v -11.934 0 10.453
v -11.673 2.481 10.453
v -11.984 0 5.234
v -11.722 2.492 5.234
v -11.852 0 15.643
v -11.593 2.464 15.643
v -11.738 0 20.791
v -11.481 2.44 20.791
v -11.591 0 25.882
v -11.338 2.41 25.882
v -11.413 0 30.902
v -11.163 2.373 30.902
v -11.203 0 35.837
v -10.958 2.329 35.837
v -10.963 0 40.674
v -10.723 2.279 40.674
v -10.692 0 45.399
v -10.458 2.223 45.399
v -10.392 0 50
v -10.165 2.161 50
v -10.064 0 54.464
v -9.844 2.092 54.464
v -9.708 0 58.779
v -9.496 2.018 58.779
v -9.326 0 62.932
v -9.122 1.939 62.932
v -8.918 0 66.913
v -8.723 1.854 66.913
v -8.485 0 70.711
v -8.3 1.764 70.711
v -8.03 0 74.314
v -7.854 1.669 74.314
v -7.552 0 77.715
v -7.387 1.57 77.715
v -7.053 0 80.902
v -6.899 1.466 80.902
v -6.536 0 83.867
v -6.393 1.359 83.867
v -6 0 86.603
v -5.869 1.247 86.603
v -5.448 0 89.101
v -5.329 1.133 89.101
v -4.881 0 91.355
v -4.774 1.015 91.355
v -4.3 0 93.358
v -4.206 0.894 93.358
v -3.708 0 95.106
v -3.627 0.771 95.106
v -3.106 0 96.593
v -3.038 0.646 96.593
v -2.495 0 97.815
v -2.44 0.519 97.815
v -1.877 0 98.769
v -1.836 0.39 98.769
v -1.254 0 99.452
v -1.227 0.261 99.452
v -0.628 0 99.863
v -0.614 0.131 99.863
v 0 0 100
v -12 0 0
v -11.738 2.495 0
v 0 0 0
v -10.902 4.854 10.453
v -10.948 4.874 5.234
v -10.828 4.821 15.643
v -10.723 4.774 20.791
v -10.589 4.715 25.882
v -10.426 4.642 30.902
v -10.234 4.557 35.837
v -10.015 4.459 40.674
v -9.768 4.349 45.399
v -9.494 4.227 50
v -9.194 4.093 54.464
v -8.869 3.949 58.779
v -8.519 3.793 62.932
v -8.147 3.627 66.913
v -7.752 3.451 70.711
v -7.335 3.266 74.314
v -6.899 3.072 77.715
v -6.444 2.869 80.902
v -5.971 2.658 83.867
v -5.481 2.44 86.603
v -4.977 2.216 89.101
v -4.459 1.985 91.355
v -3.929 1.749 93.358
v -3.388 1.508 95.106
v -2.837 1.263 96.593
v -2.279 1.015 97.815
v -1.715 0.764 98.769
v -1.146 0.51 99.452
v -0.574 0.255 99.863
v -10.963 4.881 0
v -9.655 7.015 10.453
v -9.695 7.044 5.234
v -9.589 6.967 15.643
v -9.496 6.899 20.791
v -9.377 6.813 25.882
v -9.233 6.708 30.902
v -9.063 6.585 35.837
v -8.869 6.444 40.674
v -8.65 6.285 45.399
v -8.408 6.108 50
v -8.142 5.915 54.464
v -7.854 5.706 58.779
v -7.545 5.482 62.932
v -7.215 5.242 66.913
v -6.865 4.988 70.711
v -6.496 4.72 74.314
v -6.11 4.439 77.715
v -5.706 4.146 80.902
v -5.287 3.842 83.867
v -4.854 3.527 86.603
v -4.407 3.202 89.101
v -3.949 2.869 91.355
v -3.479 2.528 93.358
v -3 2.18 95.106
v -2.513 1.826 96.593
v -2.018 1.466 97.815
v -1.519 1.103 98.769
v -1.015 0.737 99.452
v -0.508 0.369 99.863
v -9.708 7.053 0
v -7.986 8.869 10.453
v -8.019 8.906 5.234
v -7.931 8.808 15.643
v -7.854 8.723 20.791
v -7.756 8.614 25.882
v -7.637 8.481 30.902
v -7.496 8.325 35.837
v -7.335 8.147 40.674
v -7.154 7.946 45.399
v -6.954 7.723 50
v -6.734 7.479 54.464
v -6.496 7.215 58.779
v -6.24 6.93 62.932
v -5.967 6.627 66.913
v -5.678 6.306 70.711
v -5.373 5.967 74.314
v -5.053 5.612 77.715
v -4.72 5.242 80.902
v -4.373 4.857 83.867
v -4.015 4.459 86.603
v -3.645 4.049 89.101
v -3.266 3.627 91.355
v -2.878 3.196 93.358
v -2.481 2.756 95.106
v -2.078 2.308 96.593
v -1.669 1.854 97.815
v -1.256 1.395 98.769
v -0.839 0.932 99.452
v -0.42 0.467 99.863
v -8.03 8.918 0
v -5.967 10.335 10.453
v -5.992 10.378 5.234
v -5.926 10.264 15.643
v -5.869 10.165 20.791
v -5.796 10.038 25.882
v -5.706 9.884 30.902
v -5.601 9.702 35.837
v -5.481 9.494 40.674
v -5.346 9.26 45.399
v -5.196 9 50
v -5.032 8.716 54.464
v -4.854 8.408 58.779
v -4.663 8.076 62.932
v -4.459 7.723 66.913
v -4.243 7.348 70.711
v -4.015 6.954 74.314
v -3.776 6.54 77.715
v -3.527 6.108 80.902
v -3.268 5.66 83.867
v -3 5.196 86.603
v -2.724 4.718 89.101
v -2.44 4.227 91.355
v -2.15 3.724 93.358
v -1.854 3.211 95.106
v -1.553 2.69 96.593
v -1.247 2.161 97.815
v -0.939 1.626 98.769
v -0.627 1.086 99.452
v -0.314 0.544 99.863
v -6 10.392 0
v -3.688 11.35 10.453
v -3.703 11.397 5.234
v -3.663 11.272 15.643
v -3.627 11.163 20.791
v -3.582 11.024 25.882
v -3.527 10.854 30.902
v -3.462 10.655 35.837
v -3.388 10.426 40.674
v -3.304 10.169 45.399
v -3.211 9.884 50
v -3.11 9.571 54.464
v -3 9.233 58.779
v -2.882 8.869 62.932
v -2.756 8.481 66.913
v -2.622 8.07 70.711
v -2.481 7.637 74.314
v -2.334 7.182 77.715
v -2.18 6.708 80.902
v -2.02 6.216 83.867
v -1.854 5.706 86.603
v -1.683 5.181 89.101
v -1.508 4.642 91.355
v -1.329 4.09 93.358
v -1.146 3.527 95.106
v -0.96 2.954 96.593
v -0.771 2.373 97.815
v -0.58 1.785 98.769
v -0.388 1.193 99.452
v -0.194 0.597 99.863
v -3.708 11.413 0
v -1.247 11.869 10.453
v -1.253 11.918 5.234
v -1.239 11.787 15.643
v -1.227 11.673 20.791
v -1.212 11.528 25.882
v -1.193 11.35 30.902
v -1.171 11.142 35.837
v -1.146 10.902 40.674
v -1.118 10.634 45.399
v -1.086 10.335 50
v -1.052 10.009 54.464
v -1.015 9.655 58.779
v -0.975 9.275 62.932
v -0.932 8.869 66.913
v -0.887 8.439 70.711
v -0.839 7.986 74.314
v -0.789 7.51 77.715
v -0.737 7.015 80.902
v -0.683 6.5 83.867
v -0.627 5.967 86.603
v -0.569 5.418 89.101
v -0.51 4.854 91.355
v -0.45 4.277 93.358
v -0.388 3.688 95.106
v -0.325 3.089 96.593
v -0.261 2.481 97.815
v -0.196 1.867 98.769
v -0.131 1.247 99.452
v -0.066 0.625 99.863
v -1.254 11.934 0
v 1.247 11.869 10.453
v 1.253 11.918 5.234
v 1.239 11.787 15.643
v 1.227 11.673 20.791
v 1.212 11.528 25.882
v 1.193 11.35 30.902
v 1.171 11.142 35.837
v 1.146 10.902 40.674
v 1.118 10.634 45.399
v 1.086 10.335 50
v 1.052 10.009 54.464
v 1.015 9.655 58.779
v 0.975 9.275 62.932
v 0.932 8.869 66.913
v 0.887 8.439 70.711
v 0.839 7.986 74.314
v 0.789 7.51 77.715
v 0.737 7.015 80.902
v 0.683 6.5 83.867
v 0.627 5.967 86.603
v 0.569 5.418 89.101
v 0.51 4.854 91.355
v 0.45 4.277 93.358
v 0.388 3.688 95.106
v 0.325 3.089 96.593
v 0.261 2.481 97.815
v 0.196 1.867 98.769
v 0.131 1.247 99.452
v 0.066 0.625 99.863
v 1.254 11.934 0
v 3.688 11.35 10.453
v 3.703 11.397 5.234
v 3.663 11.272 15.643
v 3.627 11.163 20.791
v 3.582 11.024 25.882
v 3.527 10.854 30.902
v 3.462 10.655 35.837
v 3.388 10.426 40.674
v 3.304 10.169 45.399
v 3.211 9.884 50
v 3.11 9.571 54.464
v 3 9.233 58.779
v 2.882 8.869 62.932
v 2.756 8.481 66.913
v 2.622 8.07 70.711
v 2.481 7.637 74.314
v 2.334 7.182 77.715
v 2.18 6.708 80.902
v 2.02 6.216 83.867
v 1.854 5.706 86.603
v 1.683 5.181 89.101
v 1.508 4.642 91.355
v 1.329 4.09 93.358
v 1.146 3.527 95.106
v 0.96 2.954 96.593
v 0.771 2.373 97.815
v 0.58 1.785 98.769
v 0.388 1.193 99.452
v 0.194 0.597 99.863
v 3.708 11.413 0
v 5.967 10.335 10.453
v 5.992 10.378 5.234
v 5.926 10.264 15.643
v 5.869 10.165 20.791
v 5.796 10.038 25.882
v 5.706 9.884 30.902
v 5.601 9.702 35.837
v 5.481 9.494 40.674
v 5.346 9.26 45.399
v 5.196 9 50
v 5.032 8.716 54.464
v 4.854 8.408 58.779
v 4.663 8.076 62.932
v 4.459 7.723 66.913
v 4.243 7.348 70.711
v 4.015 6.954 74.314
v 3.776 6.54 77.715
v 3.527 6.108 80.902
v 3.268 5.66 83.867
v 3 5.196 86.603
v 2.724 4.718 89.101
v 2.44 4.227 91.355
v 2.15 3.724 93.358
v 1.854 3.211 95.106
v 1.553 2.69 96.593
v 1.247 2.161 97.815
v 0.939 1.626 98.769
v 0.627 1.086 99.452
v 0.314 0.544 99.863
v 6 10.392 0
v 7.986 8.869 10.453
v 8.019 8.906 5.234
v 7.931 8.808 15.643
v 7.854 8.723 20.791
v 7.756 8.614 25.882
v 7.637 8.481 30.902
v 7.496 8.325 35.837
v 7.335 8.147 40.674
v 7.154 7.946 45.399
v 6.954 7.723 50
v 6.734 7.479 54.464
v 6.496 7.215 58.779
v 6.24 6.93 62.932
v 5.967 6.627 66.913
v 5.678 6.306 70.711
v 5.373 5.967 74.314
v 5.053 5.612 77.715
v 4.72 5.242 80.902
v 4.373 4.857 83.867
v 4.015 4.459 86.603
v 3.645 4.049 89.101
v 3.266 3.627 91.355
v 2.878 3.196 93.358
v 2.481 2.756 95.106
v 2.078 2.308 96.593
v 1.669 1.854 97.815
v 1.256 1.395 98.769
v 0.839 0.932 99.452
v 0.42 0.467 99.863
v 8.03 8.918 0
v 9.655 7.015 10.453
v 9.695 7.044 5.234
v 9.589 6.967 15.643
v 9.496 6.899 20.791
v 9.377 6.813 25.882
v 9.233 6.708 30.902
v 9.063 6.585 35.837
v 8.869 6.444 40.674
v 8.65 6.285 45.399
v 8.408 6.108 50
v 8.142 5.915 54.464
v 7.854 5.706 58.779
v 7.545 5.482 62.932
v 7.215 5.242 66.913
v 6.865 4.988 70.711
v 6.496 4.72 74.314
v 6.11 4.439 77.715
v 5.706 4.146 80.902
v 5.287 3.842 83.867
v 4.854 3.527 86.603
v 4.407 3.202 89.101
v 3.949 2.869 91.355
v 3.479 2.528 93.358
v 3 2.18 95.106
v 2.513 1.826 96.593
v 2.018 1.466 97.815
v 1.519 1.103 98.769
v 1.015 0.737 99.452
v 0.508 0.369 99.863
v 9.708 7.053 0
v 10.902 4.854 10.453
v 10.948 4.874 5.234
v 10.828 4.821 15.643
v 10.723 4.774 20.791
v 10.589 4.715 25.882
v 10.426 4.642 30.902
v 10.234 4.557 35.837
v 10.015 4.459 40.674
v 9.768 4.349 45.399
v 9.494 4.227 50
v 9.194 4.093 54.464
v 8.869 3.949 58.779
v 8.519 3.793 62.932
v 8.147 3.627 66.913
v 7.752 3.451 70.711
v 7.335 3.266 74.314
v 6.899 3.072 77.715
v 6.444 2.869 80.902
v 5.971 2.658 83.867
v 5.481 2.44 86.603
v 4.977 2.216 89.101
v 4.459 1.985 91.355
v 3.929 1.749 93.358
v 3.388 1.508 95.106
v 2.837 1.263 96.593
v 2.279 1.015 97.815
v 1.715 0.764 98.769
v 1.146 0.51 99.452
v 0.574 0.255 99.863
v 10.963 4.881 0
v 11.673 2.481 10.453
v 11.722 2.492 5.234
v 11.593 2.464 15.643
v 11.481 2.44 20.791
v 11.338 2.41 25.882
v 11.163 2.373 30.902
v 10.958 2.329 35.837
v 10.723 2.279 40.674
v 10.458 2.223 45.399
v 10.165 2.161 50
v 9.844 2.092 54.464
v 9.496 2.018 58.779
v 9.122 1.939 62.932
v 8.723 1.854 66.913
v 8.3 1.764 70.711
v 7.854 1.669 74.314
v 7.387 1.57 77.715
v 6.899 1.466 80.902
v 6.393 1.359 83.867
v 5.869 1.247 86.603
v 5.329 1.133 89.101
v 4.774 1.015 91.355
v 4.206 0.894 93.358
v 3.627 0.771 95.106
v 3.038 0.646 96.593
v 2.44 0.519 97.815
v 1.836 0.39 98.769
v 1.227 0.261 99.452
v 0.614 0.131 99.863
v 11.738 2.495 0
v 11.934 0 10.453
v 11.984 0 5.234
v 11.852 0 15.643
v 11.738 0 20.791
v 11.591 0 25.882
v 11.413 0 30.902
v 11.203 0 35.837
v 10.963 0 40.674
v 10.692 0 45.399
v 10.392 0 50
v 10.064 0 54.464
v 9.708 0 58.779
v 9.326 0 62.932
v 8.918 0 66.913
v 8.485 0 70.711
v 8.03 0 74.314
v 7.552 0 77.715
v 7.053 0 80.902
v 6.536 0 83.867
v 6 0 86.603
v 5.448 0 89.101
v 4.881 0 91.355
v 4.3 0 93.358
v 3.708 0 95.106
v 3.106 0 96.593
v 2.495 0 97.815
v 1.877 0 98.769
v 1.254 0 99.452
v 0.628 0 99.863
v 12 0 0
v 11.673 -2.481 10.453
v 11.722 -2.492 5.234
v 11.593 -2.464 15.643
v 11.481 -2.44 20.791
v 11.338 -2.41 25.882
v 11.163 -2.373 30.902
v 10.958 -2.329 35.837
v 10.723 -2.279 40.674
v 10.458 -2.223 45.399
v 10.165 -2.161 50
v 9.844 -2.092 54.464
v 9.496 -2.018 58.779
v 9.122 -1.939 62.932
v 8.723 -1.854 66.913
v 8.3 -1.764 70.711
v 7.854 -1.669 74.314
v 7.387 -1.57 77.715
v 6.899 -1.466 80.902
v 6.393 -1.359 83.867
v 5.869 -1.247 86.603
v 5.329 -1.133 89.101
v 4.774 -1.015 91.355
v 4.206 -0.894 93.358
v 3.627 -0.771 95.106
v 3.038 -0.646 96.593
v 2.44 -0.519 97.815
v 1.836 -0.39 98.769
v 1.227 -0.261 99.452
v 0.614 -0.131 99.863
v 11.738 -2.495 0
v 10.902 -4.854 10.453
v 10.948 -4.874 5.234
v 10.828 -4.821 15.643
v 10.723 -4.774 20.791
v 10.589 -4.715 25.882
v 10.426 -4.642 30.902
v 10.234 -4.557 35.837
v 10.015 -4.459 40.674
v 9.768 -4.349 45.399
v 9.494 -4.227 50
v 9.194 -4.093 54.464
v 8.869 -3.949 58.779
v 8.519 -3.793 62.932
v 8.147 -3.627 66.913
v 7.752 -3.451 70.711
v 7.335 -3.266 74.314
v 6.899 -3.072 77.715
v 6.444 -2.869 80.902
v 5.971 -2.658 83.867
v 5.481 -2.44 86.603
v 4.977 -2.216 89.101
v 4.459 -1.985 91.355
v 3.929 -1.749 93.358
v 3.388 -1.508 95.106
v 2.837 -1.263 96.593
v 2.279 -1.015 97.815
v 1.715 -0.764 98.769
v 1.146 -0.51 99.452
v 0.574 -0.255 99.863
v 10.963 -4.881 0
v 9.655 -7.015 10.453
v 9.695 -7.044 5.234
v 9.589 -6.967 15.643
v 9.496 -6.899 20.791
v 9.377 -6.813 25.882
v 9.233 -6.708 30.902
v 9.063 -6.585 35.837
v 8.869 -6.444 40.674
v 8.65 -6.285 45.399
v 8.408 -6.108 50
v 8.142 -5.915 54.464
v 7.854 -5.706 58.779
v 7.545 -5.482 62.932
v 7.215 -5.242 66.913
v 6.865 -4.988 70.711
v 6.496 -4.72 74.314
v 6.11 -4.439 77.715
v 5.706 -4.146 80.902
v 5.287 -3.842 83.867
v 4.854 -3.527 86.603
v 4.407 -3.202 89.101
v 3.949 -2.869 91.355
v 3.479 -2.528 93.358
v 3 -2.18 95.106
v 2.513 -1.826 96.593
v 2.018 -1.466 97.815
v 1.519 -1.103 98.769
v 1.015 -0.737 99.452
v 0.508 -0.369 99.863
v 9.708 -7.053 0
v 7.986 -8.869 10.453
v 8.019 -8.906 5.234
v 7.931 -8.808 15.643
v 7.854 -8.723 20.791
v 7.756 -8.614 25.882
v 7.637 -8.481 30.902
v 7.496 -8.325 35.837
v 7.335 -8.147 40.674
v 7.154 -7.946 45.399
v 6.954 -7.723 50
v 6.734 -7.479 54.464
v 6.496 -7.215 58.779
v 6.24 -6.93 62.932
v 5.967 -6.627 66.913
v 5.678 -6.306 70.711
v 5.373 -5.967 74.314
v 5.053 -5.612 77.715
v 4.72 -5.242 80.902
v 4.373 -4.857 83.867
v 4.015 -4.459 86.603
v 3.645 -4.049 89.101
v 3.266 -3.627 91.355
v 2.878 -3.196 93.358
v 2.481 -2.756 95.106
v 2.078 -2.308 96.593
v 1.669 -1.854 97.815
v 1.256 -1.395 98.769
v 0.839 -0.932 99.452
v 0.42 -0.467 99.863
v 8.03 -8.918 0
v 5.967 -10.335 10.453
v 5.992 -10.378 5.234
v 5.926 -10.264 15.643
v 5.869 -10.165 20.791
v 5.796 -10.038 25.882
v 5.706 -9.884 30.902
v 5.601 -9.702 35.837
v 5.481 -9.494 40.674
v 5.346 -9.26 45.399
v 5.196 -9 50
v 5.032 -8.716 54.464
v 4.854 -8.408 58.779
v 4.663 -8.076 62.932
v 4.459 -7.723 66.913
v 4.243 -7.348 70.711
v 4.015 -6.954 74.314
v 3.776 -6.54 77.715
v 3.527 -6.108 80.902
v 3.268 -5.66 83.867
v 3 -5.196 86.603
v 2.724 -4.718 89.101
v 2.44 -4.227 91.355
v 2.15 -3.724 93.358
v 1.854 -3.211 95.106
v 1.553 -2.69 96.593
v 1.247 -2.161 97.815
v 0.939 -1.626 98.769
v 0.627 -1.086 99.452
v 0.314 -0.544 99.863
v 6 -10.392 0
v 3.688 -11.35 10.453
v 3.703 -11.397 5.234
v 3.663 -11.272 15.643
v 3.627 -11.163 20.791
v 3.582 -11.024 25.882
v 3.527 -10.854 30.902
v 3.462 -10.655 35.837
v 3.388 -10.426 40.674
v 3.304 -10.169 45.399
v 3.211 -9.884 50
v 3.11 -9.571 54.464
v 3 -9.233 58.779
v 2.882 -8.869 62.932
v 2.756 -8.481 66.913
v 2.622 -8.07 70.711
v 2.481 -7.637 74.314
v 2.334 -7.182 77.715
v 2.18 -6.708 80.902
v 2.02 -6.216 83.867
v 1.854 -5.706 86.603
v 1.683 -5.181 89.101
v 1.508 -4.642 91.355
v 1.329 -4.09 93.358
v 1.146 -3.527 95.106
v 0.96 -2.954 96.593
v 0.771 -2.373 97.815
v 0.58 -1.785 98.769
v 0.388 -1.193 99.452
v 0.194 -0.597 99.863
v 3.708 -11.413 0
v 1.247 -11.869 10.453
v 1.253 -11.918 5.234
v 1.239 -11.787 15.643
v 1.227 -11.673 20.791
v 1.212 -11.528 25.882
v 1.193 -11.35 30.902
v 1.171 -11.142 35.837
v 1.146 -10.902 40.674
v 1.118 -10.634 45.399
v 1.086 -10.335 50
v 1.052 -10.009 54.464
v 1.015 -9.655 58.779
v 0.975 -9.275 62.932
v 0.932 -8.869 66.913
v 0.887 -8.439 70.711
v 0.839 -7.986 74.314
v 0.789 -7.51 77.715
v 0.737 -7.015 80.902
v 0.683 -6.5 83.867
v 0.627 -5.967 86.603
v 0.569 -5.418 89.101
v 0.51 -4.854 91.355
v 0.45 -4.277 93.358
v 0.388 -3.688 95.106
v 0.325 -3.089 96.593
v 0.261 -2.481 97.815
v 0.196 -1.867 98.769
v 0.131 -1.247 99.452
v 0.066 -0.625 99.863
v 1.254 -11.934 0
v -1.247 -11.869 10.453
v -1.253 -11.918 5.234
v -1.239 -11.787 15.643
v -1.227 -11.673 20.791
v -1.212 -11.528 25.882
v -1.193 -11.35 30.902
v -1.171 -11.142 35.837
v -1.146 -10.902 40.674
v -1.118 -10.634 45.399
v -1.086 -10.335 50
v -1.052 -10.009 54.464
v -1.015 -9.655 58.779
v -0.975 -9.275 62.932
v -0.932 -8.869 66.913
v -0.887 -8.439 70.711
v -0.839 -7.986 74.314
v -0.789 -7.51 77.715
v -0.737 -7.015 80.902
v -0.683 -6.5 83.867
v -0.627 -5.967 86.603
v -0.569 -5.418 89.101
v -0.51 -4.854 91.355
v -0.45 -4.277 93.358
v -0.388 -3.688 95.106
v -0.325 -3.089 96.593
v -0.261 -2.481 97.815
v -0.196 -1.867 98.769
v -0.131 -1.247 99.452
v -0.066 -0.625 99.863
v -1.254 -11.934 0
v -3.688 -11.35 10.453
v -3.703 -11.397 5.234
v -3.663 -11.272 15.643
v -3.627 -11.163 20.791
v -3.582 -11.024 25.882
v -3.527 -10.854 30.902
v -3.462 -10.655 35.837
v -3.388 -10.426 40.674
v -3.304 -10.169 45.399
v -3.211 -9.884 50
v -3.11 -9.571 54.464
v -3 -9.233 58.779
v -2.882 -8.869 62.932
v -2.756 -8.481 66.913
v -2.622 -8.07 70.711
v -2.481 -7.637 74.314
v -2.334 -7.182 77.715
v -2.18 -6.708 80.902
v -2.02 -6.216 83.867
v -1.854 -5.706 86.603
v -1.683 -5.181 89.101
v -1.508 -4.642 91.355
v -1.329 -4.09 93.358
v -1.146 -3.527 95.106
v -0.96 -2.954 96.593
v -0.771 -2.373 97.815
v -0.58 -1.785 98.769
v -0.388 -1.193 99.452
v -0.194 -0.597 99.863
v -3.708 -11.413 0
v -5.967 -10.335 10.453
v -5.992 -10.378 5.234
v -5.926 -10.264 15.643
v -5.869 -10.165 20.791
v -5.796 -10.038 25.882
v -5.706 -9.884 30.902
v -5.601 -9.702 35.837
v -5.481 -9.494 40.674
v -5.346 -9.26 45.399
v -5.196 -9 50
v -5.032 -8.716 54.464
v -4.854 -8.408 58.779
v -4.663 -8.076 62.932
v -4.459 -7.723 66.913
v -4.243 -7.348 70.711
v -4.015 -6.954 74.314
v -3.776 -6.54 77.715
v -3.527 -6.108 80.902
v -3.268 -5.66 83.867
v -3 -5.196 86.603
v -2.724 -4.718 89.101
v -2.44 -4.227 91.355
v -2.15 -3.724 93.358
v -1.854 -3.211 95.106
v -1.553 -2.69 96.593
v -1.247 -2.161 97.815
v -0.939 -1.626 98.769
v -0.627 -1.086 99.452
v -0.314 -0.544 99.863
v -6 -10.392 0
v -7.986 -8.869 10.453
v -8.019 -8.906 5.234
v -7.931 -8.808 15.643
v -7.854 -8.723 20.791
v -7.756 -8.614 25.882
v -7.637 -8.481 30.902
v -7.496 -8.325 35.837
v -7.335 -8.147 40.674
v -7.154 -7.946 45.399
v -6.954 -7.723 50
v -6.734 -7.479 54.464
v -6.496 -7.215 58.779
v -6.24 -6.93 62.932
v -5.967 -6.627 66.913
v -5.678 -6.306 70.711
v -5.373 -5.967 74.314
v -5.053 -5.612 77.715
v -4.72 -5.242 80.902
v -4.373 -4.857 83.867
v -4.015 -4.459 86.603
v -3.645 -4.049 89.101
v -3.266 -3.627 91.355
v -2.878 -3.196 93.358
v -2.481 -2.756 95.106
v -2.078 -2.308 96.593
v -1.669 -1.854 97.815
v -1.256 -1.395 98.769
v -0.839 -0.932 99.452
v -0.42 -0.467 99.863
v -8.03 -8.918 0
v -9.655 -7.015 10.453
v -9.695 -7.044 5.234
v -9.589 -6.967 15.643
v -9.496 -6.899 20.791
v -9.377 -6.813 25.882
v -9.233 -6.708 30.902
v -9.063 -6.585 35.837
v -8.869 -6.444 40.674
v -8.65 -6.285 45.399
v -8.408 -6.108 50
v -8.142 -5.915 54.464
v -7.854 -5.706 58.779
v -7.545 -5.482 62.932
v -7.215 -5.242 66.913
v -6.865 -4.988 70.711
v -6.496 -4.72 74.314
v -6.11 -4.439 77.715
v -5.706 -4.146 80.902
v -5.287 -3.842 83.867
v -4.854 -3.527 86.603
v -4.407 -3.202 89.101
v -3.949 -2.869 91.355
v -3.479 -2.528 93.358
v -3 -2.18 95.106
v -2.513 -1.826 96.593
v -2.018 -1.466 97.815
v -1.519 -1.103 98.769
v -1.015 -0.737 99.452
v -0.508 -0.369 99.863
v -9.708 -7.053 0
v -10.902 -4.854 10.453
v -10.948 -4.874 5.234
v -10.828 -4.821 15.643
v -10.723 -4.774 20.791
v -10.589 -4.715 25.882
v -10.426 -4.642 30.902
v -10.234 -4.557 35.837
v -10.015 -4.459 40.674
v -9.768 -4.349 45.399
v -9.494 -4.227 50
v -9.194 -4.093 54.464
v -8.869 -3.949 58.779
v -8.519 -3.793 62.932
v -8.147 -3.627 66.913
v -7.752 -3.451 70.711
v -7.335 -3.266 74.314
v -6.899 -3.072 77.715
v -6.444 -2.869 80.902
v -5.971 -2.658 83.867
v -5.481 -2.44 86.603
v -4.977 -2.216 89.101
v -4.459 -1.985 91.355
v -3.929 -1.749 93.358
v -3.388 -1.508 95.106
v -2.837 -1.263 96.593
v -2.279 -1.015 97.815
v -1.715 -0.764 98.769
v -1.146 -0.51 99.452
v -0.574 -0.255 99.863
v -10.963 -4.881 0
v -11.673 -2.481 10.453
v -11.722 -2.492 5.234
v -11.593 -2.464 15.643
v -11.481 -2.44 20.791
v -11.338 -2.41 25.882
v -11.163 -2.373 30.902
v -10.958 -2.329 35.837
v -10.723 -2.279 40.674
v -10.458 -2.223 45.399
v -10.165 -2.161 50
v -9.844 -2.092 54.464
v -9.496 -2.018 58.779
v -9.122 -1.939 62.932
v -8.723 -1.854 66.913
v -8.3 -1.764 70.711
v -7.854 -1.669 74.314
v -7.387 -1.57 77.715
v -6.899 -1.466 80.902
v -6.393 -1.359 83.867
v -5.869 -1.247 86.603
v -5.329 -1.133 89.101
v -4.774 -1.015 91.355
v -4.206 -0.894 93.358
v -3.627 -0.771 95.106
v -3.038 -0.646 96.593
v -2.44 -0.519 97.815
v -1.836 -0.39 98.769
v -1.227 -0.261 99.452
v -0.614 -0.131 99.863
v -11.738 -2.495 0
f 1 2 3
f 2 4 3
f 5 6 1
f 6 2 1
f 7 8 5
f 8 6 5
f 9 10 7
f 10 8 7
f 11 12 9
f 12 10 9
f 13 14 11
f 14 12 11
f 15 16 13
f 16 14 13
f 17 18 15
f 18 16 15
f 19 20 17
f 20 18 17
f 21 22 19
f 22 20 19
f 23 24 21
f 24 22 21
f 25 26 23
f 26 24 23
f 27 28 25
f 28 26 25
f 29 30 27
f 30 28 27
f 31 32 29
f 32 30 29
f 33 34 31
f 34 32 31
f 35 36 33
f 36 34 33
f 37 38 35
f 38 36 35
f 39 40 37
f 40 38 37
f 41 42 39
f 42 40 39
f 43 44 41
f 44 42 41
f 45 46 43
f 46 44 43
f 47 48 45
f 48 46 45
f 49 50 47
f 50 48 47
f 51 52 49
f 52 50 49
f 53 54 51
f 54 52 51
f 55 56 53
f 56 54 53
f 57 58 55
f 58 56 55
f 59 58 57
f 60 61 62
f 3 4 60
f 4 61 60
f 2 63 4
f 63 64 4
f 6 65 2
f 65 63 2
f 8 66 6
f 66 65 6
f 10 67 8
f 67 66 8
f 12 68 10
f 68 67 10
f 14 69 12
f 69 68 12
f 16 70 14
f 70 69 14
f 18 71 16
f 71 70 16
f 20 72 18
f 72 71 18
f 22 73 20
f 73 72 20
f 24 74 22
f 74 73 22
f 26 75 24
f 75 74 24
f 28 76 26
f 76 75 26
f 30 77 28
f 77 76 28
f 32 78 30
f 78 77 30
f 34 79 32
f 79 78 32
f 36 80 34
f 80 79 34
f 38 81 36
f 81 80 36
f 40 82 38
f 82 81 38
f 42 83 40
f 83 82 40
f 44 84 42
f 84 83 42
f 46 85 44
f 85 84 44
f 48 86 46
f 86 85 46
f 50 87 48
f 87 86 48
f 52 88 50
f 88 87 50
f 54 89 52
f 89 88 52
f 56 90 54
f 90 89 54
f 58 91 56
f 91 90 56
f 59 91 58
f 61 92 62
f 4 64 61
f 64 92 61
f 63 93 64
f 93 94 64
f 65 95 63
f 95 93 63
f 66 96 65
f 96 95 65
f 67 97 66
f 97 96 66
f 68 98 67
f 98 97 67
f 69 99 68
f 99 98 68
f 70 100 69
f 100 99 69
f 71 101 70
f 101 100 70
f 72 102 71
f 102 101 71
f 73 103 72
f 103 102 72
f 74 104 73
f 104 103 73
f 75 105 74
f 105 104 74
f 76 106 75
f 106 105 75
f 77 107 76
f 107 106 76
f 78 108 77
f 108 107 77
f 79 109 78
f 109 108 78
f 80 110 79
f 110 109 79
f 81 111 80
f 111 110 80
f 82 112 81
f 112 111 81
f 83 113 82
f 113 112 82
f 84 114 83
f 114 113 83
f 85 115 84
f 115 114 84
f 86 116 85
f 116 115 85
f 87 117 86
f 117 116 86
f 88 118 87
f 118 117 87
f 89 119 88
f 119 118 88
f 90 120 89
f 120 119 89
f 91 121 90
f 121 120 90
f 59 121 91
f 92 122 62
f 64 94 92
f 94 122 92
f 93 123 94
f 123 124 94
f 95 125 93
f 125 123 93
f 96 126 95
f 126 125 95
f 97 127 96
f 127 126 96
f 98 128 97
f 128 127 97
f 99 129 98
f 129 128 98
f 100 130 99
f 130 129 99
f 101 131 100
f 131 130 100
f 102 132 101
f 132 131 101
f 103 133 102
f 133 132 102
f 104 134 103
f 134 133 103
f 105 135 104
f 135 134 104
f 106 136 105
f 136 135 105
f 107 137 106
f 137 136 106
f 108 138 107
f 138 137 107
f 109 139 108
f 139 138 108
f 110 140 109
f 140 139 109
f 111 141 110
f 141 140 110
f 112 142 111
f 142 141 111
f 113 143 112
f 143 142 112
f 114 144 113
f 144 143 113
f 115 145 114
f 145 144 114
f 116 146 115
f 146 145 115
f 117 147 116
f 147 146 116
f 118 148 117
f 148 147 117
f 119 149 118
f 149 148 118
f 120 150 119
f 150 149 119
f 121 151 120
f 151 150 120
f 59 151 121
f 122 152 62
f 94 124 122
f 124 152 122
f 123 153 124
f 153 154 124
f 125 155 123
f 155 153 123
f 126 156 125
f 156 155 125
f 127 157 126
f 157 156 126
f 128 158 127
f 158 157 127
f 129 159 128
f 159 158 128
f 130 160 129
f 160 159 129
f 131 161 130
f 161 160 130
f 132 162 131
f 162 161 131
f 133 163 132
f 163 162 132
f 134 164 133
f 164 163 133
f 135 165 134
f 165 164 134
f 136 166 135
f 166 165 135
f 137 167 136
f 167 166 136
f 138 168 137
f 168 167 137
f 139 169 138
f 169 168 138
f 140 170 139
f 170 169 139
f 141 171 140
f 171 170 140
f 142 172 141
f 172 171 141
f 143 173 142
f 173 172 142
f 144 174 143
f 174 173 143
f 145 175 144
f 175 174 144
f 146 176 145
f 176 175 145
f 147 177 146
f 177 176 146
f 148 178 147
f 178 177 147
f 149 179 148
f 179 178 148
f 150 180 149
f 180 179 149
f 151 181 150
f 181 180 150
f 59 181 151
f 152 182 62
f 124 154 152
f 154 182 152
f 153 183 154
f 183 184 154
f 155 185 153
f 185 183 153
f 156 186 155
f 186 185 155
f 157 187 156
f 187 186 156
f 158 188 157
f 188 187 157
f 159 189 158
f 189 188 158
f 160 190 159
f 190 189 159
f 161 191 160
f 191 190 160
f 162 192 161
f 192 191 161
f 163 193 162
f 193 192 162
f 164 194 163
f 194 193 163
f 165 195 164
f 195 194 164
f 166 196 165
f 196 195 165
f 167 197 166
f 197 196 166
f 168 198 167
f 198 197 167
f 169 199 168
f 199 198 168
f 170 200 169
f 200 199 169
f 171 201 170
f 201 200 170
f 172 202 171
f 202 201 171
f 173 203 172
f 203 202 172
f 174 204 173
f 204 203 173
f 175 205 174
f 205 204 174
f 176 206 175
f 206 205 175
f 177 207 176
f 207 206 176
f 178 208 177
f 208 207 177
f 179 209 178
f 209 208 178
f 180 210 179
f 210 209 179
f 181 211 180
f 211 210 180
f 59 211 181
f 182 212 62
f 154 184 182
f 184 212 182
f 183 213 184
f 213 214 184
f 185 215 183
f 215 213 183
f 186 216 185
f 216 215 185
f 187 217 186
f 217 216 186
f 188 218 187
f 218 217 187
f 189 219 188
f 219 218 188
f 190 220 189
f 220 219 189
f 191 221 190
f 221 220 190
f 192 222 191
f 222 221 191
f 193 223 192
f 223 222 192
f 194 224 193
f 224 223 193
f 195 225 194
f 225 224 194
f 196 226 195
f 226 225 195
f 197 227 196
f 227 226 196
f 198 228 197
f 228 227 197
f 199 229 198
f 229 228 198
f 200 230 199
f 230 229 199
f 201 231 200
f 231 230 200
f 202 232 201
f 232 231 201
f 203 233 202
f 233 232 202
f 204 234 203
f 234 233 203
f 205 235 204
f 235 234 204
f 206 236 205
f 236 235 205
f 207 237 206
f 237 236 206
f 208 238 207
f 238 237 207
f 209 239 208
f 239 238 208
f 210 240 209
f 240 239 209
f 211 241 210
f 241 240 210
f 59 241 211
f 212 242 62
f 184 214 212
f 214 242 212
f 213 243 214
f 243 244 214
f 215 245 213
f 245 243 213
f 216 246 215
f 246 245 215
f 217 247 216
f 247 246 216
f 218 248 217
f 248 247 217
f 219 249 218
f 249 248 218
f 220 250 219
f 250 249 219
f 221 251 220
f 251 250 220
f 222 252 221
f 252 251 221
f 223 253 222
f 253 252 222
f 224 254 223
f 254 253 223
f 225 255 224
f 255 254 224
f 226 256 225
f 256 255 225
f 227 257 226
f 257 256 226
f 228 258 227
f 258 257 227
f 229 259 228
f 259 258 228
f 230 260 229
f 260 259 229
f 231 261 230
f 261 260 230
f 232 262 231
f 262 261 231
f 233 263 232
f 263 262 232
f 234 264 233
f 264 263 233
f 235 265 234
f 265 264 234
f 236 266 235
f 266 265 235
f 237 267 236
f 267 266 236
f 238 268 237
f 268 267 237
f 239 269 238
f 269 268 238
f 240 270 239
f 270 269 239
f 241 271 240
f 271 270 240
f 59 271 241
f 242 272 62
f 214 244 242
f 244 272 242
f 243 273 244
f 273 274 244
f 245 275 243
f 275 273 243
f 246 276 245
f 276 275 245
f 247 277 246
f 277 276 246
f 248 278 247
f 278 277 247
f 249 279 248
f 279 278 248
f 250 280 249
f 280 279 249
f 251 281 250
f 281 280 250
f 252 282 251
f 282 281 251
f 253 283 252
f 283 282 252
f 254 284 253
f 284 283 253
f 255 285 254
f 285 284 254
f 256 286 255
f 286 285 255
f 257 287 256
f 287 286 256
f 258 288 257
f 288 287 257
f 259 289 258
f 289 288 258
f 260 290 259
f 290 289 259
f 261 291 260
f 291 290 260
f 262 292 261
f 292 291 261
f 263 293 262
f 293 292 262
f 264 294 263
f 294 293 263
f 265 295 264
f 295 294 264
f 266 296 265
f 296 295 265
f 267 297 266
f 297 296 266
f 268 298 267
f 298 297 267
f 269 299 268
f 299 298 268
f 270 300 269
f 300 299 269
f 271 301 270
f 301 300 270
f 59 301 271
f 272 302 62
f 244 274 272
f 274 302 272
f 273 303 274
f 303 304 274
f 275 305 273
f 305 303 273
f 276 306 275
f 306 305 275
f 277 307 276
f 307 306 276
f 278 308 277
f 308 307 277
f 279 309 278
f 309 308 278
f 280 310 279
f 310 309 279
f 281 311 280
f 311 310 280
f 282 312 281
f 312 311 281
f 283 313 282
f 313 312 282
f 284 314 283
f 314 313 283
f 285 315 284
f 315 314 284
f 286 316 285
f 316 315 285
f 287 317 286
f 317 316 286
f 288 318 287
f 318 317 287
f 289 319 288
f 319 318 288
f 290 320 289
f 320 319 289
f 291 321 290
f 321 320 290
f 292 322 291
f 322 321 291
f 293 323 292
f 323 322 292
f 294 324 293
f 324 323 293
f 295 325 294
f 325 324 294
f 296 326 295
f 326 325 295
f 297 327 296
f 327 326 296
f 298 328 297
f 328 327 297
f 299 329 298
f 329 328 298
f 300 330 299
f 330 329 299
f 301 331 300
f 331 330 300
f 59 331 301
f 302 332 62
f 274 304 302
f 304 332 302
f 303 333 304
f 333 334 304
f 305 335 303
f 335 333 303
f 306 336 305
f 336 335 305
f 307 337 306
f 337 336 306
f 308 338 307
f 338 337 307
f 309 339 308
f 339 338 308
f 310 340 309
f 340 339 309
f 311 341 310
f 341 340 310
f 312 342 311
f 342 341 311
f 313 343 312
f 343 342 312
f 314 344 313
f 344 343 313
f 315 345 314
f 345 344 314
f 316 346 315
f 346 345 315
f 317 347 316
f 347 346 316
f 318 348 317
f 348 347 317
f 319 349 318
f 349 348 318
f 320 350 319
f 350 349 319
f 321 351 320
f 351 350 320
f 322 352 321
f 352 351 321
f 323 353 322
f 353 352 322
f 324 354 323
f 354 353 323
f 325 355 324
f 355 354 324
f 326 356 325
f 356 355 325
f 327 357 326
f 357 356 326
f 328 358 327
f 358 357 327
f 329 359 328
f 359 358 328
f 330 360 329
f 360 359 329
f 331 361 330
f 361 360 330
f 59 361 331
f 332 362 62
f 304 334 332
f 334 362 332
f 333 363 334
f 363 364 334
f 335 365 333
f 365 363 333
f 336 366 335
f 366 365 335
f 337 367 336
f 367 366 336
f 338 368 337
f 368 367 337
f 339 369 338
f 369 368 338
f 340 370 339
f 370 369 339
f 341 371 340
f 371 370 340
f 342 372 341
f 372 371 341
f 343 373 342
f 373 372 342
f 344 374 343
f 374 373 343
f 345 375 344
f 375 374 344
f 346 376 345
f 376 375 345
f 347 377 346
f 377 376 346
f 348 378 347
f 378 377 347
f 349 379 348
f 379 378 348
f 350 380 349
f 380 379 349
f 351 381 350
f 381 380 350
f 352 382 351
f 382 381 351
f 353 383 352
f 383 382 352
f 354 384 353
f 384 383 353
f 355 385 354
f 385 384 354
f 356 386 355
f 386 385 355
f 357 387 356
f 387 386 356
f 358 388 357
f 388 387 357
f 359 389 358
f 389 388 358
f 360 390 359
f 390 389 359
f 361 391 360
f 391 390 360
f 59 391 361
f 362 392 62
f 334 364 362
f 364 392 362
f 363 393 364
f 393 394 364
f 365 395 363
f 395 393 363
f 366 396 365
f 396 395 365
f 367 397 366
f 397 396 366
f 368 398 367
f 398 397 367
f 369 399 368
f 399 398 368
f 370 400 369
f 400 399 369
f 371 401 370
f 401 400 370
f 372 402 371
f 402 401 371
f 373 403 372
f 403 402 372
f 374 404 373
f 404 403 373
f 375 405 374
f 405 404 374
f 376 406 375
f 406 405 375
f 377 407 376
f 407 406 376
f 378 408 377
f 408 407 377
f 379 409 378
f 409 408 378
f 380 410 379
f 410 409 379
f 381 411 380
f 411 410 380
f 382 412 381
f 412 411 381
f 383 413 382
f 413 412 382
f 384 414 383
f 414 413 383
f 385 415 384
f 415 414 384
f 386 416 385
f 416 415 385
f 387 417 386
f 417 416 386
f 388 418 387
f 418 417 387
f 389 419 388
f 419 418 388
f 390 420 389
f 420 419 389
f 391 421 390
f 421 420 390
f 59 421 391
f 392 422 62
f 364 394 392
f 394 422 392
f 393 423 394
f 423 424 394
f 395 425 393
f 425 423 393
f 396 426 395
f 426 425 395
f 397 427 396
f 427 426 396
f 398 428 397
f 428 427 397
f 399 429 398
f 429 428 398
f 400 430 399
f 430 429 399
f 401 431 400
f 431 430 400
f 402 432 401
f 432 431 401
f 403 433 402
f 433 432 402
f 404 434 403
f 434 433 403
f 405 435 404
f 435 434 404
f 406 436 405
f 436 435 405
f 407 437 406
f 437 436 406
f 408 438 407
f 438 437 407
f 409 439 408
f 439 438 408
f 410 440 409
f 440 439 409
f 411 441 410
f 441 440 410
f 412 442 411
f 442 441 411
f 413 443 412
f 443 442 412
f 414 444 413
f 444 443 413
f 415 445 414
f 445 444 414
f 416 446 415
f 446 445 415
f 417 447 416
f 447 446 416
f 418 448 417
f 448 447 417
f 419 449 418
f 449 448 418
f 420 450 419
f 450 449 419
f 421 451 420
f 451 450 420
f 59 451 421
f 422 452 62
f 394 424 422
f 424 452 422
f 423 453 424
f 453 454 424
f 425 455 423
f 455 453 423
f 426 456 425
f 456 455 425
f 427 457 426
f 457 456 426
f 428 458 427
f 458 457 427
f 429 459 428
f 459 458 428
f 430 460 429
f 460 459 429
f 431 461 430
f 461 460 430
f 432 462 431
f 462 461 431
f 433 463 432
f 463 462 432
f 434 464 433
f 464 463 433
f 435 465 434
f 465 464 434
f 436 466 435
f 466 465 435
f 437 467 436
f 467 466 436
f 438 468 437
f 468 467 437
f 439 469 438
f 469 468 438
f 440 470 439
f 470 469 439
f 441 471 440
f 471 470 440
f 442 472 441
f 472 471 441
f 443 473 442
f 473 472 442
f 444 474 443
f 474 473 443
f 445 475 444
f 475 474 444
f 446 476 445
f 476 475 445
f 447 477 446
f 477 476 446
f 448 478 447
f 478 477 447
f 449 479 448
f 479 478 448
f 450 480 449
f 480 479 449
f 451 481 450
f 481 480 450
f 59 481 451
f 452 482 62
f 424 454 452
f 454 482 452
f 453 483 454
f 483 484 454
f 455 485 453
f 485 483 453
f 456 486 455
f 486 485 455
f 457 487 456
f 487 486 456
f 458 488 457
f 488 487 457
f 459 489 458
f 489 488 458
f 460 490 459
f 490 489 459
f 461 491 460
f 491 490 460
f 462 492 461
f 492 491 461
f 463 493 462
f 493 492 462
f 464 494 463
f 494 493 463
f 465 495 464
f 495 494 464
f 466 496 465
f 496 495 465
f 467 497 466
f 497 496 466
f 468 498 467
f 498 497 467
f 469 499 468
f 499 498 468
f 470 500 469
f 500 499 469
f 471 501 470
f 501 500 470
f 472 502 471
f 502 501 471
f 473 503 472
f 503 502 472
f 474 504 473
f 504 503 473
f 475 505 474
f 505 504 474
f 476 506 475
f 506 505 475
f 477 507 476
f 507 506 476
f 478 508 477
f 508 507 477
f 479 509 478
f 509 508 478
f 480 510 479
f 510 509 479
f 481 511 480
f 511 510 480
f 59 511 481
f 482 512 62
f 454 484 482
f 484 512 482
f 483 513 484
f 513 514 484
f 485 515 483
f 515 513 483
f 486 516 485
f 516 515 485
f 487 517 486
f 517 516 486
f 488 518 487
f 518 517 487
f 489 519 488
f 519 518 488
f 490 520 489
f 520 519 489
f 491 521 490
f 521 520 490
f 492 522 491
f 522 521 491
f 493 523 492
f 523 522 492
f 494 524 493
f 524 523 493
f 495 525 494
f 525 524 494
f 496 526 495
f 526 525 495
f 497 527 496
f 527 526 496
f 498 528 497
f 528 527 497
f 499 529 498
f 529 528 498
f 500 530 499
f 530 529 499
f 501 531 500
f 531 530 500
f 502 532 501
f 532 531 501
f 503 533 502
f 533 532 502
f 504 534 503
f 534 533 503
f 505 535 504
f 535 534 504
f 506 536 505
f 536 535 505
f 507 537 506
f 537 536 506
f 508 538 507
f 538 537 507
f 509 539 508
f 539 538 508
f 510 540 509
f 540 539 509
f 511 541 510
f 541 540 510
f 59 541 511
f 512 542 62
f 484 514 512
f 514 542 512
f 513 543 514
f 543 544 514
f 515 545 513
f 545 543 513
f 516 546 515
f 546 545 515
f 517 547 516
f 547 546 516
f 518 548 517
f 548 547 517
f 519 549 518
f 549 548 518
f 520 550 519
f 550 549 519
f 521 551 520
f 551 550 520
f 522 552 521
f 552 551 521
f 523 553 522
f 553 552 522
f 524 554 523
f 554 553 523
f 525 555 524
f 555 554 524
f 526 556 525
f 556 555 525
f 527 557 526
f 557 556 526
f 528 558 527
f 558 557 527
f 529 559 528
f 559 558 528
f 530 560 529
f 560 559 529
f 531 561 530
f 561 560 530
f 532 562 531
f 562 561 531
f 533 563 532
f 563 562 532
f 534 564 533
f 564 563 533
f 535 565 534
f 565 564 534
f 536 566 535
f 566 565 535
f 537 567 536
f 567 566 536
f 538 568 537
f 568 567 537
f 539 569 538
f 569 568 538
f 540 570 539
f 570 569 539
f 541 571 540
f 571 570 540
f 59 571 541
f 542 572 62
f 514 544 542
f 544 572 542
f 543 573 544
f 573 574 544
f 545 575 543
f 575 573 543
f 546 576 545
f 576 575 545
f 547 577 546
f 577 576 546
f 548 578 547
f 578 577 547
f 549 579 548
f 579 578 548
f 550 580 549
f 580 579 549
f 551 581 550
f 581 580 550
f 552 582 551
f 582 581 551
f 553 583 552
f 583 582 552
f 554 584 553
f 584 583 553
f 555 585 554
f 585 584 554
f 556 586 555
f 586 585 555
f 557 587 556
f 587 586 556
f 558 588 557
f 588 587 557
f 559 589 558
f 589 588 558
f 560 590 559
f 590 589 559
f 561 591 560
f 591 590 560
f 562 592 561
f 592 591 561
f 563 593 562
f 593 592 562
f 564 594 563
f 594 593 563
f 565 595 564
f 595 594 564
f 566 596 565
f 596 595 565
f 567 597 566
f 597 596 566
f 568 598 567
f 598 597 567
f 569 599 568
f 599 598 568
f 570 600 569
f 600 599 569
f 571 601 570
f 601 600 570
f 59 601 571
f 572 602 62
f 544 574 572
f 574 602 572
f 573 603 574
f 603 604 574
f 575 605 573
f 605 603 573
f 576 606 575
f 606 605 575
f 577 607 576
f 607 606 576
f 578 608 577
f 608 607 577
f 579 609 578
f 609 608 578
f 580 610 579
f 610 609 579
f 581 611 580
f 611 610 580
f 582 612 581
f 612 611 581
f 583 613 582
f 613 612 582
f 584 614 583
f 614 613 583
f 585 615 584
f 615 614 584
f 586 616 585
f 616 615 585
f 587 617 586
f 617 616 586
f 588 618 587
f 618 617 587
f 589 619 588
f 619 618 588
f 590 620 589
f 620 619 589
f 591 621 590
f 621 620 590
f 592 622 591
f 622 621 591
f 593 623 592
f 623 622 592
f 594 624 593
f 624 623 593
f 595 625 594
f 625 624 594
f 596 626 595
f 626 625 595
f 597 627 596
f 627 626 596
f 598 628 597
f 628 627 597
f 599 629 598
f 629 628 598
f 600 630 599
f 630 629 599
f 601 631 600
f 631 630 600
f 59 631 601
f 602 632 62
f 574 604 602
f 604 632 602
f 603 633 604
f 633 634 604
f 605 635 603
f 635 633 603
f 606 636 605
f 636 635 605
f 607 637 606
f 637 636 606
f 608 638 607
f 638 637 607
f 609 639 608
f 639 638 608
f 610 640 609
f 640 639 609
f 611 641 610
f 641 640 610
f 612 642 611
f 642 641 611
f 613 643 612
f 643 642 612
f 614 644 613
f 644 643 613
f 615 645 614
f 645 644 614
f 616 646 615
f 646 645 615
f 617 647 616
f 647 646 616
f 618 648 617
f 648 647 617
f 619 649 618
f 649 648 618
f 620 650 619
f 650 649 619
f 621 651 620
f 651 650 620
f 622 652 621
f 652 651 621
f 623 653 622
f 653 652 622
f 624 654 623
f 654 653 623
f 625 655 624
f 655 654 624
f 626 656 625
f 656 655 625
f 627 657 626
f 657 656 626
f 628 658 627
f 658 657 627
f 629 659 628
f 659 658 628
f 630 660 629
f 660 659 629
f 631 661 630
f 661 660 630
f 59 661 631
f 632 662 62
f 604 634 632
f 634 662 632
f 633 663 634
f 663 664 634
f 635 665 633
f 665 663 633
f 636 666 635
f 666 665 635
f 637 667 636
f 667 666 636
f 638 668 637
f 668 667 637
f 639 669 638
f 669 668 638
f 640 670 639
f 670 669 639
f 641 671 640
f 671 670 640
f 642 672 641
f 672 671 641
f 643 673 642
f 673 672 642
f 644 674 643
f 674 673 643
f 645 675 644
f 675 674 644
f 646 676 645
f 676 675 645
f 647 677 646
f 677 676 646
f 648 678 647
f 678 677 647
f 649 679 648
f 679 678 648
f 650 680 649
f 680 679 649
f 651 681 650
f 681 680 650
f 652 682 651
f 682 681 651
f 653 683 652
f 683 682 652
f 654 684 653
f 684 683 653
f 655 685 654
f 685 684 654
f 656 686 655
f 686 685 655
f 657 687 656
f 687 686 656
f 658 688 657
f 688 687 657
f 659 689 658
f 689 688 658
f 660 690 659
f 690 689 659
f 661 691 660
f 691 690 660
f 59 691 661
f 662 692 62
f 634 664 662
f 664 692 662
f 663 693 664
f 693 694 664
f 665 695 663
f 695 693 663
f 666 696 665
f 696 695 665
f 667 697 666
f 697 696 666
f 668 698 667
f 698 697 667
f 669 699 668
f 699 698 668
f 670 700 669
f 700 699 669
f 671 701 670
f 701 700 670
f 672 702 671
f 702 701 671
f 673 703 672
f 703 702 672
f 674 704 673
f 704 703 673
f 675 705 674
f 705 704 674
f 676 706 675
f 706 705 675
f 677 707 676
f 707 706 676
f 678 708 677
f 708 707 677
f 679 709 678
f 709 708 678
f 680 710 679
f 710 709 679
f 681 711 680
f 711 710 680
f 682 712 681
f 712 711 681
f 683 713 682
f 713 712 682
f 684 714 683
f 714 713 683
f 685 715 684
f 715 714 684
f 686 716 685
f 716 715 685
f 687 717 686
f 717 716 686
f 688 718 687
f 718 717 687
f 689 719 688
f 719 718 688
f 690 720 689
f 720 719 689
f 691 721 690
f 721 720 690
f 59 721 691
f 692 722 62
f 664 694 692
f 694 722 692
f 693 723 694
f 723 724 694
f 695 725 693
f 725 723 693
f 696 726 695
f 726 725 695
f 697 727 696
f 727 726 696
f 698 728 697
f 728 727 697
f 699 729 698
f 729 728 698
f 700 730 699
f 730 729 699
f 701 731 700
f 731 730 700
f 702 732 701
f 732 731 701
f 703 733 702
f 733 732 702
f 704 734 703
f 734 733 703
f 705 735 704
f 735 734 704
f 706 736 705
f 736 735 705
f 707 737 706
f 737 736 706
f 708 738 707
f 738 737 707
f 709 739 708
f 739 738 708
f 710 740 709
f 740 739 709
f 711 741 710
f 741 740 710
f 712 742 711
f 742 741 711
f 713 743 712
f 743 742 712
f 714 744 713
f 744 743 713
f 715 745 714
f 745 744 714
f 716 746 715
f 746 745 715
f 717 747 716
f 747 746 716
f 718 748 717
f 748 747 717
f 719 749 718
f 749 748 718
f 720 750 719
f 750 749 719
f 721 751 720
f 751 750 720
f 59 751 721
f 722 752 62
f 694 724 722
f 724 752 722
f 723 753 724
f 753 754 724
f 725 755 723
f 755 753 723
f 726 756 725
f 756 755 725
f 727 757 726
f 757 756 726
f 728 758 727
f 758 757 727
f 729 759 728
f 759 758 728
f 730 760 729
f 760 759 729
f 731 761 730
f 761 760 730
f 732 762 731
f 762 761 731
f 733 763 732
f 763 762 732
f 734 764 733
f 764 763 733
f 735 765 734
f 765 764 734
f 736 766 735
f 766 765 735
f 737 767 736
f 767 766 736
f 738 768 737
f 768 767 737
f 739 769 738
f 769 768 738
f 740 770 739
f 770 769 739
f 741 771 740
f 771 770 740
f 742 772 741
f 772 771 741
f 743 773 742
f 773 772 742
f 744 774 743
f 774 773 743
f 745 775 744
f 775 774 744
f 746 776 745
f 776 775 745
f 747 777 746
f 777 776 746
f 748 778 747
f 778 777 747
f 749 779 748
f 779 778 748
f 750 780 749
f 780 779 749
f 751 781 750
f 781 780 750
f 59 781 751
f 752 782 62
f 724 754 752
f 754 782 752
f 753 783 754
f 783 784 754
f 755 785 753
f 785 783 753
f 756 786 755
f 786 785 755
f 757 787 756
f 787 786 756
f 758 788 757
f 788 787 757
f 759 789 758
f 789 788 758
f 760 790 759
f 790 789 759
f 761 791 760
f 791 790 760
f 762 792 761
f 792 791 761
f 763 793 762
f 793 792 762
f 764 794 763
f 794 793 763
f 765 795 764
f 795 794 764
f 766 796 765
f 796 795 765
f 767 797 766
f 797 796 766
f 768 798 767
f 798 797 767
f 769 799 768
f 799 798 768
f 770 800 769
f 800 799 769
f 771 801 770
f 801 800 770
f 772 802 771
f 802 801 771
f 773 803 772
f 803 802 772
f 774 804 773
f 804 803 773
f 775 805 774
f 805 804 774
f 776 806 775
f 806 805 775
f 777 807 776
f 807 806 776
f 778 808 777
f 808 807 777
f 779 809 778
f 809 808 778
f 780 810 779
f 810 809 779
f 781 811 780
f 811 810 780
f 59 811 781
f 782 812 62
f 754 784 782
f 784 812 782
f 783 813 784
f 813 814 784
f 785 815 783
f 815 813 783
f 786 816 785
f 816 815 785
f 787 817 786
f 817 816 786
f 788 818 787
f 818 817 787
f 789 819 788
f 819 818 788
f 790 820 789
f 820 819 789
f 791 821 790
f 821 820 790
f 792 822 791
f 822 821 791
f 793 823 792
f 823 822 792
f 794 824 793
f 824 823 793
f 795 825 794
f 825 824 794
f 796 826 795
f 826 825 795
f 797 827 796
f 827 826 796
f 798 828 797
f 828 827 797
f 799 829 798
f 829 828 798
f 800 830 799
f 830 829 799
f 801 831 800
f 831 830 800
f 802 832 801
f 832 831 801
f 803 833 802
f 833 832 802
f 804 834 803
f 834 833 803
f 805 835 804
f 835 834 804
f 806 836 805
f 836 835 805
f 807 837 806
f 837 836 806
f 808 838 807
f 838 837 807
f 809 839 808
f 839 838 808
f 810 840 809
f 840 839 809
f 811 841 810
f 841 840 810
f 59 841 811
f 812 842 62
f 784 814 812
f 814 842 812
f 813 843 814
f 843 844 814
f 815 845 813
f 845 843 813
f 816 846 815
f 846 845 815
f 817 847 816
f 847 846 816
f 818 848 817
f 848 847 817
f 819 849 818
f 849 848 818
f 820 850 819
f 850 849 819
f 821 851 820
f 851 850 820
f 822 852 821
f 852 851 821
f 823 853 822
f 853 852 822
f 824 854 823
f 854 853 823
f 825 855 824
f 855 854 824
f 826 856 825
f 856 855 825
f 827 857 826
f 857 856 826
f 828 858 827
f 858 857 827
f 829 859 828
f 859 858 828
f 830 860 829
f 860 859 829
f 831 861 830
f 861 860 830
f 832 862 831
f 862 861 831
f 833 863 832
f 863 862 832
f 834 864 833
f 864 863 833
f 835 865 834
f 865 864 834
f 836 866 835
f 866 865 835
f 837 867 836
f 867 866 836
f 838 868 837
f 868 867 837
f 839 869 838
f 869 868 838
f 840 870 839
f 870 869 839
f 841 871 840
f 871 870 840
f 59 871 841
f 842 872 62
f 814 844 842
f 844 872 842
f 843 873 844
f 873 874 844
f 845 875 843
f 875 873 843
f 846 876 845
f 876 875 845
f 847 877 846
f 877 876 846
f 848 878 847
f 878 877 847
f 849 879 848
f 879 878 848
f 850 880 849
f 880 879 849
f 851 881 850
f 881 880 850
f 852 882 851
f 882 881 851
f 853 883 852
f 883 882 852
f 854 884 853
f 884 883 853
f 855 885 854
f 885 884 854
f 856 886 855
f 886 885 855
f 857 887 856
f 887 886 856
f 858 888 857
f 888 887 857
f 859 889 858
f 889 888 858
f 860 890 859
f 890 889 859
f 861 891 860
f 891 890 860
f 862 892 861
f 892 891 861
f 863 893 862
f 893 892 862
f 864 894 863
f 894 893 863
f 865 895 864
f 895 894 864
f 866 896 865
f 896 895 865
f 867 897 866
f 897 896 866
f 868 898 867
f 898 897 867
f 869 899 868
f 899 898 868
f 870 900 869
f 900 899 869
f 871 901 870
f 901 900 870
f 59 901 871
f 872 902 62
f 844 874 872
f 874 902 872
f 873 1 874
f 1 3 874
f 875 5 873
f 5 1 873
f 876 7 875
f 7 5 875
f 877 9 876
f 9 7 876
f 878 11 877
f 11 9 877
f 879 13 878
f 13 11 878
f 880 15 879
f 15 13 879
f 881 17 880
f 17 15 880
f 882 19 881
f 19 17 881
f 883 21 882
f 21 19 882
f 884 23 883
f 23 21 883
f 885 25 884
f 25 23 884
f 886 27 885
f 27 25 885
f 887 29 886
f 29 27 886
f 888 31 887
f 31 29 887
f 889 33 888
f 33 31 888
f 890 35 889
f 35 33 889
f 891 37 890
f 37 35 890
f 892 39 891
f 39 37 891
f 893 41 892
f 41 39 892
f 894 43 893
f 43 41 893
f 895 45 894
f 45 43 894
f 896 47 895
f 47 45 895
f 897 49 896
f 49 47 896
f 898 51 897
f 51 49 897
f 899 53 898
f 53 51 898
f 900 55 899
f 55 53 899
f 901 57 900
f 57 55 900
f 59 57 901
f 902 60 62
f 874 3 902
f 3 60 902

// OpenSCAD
/****************************************************************
* Elliptical nose cone (optimized version)
*
* y = R * sqrt(1 - x^2 / L^2)                  (x measured from the base)
*
* Optimization: the profile is a 2D polygon revolved by ONE
* rotate_extrude, instead of a union of stacked cylinders.
* The ellipse is sampled with its parametric angle
* (r = R*cos(t), z = L*sin(t)), which puts more points near the blunt
* tip, where the curve turns fastest, and fewer along the flat sides.
*
* Orientation: base at Z = 0, tip at Z = L (the original file had the
* tip at Z = 0, unlike the other nose cone files).
*****************************************************************/

/* ---------- parameters ---------- */
L = 100;               // nose cone length (mm)
R = 24/2;              // base radius (mm)

/* ---------- quality settings ---------- */
profileSegments = 30;  // segments along the profile
fnAround        = 30;  // segments around the axis

/* Do not modify anything after that unless you know what you are doing */

// Profile points [radius, z], from the base (z = 0) to the tip (z = L)
function noseProfilePoints() =
    [for (i = [0:profileSegments]) let(t = 90 * i / profileSegments)
        (i == profileSegments) ? [0, L] : [R * cos(t), L * sin(t)]];

// 2D half-section, closed along the axis
module noseProfile() {
    polygon(concat([[0, 0]], noseProfilePoints()));
}

module ogive() {
    rotate_extrude($fn = fnAround) noseProfile();
}

ogive();
